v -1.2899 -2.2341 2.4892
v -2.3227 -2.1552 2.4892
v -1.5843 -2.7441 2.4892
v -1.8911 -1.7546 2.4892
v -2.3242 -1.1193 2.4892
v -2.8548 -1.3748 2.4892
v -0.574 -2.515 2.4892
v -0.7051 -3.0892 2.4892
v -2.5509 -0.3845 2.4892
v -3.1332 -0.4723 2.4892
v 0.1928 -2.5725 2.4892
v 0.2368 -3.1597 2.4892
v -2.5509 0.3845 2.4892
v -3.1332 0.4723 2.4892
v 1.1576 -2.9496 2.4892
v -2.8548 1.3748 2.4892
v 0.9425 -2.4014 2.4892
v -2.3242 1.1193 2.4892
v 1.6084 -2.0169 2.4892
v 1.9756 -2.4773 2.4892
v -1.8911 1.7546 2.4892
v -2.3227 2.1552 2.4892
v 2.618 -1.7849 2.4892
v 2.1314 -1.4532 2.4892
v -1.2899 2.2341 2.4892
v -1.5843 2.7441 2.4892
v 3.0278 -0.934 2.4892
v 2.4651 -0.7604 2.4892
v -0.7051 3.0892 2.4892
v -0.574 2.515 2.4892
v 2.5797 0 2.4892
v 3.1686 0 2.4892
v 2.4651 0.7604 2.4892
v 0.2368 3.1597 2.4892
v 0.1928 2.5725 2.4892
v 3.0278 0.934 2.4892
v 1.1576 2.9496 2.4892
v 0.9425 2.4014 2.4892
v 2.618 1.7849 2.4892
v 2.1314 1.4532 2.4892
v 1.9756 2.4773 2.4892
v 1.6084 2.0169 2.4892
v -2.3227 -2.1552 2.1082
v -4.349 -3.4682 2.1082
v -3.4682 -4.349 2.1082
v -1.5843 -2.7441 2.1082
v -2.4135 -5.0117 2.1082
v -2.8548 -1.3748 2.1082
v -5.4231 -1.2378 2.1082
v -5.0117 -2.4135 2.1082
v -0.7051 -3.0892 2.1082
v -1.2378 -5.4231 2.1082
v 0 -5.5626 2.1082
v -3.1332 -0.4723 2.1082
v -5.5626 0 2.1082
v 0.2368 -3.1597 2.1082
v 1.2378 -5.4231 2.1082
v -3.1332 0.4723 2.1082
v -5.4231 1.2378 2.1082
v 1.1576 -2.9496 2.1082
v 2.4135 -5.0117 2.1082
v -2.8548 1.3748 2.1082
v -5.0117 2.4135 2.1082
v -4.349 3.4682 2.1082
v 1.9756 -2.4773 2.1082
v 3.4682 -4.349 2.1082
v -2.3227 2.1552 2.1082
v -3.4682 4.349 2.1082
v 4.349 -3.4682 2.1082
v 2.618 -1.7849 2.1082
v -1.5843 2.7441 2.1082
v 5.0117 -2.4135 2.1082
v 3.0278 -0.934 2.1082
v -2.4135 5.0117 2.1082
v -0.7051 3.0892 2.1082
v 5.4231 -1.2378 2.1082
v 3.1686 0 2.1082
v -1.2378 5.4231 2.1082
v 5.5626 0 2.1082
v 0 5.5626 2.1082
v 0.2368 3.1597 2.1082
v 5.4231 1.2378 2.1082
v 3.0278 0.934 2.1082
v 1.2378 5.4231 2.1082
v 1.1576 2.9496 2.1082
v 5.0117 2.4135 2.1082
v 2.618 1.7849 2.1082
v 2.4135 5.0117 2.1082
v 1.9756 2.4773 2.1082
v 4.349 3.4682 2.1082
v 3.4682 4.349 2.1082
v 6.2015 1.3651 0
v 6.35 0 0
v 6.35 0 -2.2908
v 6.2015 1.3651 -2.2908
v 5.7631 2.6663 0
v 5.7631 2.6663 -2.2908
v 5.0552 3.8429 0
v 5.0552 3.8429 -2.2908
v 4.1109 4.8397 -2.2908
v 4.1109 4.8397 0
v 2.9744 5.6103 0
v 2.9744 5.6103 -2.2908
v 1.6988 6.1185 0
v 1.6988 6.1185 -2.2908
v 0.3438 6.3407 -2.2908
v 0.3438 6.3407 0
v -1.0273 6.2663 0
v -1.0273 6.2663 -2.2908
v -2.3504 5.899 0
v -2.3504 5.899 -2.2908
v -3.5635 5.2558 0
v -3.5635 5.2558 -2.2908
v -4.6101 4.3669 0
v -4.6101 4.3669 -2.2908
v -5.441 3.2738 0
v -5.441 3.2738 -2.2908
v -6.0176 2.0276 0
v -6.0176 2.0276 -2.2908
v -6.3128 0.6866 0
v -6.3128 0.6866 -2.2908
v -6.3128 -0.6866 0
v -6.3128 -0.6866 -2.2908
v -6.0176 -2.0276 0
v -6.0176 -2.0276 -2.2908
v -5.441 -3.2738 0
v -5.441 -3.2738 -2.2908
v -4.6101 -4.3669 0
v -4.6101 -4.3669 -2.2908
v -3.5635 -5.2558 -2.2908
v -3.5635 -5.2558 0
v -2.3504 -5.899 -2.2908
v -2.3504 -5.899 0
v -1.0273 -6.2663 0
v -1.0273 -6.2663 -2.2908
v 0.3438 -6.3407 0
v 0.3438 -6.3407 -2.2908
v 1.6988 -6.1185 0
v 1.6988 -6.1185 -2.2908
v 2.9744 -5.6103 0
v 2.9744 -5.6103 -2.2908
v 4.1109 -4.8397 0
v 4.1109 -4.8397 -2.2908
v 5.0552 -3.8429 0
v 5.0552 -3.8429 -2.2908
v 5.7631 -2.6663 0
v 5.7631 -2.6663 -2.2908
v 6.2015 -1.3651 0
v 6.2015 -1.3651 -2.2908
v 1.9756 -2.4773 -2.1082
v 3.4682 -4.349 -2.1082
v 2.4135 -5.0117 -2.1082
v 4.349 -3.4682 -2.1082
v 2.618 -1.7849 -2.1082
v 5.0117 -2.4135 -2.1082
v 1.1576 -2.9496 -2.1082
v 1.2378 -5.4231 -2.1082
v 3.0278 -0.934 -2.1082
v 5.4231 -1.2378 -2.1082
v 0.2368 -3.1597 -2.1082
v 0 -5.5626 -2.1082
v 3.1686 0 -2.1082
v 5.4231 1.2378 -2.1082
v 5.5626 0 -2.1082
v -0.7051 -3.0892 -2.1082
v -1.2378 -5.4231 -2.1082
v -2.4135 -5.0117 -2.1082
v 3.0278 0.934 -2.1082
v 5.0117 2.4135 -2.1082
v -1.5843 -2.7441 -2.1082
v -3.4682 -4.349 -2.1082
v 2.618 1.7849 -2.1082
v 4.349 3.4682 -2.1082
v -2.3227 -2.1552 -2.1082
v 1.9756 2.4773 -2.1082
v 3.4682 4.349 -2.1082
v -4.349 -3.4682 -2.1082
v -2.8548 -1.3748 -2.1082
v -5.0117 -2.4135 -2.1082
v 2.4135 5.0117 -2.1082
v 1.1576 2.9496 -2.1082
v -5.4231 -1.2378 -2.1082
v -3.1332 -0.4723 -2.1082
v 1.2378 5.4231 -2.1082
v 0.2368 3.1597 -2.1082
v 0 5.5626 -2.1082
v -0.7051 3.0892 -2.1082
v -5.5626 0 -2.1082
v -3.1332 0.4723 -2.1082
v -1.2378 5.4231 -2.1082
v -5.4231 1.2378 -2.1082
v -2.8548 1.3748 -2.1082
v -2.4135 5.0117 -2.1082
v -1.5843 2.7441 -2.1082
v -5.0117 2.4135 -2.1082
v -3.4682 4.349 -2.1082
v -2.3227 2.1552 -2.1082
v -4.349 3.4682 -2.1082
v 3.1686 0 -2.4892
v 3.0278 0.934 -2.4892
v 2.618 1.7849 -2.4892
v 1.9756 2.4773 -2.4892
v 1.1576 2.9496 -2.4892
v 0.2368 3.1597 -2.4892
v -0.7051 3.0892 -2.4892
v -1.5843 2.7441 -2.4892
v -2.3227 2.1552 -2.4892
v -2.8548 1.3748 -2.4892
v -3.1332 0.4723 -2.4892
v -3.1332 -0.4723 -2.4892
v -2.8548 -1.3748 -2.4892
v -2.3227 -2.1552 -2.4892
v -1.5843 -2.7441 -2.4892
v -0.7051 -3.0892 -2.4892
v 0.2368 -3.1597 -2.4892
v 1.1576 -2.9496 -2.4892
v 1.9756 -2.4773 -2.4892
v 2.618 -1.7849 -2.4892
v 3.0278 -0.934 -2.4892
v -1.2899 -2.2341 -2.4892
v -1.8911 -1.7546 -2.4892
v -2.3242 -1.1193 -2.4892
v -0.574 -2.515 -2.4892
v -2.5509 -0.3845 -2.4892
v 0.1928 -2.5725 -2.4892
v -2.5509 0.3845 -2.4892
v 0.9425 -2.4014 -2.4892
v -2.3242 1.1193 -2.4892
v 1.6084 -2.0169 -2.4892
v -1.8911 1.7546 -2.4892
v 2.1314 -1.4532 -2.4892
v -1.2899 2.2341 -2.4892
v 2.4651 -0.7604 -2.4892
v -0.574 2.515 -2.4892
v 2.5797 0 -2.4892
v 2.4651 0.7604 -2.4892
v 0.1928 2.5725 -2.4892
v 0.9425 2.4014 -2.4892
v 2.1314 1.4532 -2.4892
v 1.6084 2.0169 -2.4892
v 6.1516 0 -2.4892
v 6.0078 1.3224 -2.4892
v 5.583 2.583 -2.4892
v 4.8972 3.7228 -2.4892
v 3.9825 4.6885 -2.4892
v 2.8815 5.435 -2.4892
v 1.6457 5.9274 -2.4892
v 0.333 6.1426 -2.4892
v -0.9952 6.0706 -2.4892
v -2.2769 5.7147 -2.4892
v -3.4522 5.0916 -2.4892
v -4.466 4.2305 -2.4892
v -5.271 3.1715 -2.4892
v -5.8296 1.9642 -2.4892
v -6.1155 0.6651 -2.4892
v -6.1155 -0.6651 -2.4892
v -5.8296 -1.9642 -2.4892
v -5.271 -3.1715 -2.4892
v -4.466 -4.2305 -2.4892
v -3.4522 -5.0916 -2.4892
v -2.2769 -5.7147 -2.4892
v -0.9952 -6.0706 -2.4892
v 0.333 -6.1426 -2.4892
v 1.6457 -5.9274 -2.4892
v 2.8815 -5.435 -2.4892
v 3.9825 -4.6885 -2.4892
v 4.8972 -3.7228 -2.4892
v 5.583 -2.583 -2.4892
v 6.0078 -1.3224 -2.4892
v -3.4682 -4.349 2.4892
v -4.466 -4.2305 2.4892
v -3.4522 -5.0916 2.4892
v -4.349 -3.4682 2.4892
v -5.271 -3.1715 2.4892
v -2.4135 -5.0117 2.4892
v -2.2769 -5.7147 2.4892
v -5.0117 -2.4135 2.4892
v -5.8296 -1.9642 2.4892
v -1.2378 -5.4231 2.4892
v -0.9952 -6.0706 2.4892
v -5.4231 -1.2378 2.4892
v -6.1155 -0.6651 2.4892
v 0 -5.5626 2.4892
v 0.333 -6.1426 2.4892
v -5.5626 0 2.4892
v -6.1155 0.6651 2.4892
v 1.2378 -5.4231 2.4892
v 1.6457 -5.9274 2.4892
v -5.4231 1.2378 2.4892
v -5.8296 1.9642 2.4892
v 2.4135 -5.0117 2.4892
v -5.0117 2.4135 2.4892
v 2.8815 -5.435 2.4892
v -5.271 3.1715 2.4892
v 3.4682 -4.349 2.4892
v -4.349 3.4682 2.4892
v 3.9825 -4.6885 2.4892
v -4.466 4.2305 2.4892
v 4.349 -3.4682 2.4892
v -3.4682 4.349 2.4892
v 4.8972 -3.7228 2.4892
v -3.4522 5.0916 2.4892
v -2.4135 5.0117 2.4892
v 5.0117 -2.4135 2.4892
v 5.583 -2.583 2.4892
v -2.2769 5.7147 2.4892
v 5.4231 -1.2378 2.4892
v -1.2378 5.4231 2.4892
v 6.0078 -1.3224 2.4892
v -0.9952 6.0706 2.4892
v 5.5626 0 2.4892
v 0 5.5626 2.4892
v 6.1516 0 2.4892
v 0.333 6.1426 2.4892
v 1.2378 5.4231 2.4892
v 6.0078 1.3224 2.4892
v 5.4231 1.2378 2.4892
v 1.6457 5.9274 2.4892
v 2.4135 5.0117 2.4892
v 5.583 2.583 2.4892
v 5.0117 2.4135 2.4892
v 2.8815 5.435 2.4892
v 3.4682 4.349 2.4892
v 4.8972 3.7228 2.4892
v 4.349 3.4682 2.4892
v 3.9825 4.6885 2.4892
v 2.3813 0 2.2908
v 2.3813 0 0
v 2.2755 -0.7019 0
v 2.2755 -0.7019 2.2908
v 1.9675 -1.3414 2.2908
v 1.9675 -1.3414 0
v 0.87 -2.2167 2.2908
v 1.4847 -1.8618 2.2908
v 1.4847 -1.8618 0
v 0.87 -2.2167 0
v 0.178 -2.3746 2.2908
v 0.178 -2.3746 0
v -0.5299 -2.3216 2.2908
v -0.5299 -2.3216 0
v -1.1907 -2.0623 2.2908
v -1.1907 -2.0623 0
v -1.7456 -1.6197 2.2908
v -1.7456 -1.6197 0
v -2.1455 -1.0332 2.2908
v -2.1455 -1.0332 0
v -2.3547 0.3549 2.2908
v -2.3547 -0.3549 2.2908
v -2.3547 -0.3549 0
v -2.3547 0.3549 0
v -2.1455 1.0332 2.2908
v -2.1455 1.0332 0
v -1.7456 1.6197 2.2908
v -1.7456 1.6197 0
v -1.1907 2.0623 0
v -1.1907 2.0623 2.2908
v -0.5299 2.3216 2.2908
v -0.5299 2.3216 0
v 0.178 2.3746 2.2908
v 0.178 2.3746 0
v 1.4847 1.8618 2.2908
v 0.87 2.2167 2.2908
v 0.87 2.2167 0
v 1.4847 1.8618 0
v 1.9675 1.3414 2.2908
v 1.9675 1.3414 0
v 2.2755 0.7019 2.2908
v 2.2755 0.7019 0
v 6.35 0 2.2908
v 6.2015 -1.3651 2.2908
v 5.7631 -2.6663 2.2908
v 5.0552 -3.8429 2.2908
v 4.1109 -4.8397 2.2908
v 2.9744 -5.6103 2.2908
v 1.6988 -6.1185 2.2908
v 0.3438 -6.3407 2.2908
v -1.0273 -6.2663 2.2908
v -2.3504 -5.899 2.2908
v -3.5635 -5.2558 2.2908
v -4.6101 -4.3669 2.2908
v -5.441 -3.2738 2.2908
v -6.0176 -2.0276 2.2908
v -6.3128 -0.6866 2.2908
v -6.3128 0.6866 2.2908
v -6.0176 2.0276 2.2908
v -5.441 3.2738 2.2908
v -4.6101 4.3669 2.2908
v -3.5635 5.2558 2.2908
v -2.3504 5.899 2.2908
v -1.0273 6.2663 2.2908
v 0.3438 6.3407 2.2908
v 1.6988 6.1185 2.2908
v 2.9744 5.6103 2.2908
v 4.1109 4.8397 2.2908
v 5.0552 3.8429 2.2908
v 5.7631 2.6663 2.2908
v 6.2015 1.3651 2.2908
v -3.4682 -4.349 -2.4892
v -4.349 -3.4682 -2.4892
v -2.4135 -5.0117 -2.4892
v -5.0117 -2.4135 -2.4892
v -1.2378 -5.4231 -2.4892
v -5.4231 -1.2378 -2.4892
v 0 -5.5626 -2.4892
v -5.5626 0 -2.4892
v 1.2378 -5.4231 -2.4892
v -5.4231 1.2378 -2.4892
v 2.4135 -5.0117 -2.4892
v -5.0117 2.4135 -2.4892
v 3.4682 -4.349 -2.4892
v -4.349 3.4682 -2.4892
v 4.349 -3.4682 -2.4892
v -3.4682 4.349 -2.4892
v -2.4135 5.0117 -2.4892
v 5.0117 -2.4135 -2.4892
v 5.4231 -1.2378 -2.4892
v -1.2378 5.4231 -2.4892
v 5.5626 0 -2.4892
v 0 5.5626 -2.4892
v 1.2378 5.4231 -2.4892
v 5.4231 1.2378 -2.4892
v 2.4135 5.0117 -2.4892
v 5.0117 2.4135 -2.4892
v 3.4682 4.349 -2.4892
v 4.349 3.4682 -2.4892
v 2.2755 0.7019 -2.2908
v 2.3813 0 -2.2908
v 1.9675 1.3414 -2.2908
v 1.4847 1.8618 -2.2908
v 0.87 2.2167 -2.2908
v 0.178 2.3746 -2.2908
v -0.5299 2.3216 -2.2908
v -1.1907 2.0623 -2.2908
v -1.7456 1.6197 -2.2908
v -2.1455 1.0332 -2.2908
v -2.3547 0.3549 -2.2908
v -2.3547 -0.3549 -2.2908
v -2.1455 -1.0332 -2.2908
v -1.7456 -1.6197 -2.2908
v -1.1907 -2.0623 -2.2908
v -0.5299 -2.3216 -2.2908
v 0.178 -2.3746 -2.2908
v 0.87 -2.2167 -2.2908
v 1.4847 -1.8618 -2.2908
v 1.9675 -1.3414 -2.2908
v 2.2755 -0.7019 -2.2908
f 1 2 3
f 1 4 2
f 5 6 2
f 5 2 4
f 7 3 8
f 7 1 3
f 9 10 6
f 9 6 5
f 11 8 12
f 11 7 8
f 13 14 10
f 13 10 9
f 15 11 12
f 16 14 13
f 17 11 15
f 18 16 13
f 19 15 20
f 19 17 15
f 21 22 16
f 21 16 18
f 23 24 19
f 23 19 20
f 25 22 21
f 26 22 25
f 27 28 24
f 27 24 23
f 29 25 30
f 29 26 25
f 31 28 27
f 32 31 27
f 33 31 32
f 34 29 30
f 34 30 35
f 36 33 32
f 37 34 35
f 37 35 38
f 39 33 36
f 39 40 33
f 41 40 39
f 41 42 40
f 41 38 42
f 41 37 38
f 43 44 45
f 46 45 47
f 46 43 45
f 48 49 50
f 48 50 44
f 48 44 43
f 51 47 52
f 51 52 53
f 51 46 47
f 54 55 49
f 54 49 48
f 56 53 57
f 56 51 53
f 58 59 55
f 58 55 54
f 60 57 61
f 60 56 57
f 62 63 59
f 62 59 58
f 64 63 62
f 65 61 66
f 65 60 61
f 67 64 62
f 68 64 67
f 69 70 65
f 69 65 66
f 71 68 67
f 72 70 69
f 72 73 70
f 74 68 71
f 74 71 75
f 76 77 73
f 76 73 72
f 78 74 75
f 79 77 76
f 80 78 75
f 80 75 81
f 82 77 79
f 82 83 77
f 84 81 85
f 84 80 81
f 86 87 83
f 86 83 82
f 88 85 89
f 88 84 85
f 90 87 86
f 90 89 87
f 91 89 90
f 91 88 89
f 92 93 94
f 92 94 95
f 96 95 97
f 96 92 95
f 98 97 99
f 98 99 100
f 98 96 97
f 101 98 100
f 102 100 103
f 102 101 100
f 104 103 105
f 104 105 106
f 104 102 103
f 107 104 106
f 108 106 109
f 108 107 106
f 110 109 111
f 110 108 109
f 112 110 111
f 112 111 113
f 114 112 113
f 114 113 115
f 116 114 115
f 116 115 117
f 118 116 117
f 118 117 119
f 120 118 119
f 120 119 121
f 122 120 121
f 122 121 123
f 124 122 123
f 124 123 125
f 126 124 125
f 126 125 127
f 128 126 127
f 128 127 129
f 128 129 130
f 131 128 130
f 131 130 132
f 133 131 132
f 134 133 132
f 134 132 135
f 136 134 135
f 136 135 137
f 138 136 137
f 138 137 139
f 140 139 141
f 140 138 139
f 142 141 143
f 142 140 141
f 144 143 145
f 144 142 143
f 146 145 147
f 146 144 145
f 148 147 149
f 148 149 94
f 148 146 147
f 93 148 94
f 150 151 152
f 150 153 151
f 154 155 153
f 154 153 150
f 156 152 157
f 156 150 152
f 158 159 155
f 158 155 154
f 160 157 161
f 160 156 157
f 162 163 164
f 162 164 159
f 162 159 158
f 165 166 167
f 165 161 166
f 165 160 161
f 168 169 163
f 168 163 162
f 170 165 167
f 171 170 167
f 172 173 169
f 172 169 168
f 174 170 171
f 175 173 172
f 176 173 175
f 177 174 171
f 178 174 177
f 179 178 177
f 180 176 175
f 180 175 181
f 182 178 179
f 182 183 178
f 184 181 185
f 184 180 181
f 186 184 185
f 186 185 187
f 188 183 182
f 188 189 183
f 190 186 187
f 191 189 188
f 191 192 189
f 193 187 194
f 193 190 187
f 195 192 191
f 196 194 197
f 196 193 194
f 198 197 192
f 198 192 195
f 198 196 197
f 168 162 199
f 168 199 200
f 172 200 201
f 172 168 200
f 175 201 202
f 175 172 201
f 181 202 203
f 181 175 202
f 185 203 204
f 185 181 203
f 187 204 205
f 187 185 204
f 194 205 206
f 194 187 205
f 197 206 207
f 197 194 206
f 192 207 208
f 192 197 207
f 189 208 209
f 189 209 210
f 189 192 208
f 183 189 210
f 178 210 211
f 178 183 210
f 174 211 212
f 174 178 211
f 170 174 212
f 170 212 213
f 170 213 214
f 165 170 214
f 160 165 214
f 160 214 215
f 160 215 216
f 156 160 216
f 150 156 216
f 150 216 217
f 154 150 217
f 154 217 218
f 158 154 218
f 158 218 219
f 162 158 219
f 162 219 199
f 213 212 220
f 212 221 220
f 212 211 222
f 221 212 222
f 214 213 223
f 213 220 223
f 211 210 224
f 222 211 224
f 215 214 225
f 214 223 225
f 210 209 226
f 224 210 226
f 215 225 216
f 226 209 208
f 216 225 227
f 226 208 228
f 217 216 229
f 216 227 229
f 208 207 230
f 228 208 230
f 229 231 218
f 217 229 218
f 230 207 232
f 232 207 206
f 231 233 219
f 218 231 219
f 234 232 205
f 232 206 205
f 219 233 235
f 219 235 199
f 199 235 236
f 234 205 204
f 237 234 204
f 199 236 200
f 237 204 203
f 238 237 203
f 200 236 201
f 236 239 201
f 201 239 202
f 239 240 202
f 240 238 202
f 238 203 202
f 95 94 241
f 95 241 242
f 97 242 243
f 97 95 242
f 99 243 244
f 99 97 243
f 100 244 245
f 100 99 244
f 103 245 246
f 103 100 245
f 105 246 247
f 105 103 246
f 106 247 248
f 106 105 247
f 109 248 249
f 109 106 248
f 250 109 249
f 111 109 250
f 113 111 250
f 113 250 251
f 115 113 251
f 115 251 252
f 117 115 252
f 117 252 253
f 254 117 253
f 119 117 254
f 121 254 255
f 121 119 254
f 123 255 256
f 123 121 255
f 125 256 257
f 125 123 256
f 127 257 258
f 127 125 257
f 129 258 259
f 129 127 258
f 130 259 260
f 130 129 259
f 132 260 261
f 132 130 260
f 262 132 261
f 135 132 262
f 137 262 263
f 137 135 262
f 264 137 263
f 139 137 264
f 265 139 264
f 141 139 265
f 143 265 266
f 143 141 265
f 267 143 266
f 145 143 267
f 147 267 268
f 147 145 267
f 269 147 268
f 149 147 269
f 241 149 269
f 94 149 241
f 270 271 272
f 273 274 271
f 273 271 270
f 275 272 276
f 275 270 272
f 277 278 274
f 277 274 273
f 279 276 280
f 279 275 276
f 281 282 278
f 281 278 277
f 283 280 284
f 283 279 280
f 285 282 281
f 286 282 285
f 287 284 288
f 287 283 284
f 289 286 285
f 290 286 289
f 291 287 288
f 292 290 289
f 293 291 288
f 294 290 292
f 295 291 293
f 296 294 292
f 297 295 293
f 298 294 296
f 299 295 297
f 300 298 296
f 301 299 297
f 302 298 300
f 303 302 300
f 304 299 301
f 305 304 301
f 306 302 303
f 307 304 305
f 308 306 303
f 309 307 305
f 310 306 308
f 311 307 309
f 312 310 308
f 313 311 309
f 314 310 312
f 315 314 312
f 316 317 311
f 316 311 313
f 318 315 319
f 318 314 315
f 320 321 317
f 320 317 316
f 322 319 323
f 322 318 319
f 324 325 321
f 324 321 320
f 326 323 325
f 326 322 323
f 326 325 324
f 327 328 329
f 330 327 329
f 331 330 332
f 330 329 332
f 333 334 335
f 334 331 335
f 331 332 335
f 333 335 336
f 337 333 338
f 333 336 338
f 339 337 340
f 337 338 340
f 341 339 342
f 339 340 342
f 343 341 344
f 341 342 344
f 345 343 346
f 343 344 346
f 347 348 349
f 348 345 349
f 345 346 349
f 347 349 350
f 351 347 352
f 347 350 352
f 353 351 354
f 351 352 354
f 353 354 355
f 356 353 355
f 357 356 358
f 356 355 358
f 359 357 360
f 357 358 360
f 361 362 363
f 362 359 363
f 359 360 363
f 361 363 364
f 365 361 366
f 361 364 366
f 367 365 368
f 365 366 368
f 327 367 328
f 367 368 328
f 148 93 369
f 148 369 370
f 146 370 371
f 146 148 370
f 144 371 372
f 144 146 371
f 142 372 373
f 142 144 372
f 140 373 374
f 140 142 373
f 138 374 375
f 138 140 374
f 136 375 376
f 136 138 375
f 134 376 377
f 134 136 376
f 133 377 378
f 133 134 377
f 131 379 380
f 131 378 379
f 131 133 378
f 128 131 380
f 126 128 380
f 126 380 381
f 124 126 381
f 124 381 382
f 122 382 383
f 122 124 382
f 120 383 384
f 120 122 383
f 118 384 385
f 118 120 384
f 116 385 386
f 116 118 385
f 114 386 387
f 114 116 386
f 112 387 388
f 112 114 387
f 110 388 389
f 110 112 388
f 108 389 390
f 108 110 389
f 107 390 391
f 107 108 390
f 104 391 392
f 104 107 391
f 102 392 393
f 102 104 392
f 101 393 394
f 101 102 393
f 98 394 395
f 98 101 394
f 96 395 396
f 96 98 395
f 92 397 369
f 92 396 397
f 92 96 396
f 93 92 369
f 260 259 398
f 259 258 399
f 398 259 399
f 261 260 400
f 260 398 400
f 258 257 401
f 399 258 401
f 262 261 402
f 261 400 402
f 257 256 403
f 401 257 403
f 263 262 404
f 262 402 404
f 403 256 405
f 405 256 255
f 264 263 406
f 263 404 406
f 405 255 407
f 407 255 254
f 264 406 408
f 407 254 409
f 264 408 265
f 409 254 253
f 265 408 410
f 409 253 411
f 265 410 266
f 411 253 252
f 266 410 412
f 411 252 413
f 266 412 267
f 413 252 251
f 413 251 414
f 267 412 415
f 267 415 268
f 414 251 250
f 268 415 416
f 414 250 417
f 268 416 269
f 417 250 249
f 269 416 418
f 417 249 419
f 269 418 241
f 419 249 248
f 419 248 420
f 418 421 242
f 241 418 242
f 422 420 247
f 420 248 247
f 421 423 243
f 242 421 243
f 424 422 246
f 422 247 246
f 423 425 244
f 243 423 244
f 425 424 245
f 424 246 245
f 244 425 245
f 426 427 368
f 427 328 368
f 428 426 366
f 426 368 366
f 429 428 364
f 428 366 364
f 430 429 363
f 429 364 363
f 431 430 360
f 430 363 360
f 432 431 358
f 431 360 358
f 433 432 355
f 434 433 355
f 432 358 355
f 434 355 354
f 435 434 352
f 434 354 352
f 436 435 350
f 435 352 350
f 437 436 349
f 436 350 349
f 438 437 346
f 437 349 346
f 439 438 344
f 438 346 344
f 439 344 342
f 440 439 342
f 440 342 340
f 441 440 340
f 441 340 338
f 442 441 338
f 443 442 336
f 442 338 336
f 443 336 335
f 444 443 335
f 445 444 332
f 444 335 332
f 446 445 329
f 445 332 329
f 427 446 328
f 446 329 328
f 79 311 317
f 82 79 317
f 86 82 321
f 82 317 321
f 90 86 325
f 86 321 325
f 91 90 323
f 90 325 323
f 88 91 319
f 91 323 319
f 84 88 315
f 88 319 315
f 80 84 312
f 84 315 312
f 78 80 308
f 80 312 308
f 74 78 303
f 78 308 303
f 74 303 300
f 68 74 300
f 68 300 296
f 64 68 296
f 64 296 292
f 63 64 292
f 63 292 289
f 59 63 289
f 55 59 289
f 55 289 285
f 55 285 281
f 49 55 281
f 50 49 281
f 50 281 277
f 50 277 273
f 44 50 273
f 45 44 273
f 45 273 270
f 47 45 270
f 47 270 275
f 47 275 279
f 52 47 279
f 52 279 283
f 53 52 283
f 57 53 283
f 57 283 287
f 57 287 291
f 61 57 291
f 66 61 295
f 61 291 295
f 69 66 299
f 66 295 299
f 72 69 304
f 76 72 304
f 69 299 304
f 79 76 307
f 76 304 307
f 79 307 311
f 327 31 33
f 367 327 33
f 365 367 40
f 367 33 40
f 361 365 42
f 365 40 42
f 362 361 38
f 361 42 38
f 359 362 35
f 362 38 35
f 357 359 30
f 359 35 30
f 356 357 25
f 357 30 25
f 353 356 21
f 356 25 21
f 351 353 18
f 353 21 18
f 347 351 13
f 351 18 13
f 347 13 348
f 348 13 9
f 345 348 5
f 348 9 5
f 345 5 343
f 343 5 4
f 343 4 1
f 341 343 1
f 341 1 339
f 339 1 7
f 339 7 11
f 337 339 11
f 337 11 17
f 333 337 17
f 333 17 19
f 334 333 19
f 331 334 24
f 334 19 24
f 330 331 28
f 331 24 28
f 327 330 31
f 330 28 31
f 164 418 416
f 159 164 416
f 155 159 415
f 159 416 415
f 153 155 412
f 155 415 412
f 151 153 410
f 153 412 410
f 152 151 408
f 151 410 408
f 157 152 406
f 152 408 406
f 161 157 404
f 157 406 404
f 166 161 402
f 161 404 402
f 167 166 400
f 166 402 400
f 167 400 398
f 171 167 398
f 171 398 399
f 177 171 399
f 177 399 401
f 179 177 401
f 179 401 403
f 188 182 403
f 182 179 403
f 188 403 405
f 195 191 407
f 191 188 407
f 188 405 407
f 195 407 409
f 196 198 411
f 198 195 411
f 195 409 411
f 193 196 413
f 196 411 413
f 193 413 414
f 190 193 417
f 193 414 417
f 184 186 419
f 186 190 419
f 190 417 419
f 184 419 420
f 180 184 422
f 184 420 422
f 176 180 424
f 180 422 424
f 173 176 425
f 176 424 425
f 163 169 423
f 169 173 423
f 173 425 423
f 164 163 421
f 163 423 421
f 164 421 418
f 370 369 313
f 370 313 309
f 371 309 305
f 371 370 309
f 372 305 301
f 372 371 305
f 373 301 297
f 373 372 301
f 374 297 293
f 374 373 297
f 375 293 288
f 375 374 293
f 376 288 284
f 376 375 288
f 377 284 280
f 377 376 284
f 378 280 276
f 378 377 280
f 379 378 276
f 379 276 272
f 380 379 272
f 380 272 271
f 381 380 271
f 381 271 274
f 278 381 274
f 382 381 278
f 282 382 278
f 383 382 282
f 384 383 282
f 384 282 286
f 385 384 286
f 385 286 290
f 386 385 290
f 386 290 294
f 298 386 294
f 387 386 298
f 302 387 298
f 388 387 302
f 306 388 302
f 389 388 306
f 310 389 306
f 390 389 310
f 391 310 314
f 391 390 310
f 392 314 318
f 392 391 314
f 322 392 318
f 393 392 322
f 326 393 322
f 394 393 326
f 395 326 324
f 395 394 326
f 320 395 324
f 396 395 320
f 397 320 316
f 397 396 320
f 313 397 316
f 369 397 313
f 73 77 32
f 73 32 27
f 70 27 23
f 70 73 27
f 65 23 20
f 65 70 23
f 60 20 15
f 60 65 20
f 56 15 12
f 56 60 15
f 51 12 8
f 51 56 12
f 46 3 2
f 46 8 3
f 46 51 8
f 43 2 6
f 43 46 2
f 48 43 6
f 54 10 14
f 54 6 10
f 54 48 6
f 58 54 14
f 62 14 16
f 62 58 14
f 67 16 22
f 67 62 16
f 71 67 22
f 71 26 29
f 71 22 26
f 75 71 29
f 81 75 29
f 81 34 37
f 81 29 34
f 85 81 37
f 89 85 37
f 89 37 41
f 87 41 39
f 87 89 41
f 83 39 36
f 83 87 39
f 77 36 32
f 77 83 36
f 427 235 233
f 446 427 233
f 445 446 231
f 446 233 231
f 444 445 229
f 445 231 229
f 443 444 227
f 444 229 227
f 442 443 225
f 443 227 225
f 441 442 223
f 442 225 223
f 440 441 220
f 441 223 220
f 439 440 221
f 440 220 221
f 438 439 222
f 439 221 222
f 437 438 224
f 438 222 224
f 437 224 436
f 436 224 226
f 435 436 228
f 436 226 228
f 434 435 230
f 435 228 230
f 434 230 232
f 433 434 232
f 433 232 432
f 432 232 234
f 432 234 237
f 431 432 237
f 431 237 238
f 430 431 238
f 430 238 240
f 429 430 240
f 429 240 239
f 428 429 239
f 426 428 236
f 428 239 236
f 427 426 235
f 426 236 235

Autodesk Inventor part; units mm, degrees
ref_plane "YZ Plane" through (0, 0, 0) normal (1, 0, 0) x (0, 1, 0)
ref_plane "XZ Plane" through (0, 0, 0) normal (0, 1, 0) x (-1, 0, 0)
ref_plane "XY Plane" through (0, 0, 0) normal (0, 0, 1) x (1, 0, 0)
sketch "Sketch1" plane through (0, 0, 0) normal (0, 0, 1) x (1, 0, 0)
  circle A0 centre (0, 0) radius 2.3813
  circle A1 centre (0, 0) radius 6.35
  dimension "d0" = 4.7625
  dimension "d1" = 12.7
extrude "Extrusion1" add sketch "Sketch1" along normal mid plane 4.9784
chamfer "Chamfer1" distance 0.1984 angle 45 4 edges at (-6.35, 0, 2.4892) (-2.3813, 0, 2.4892) (-6.35, 0, -2.4892) (-2.3813, 0, -2.4892)
sketch "Sketch2" plane through (0, 0, 0) normal (0, 1, 0) x (-1, 0, 0)
  line L0 (-6.1516, 2.4892) -> (6.1516, 2.4892) projected
  line L1 (2.5797, 2.4892) -> (-2.5797, 2.4892) projected
  line L2 (-5.5626, 2.4892) -> (-3.1686, 2.4892)
  line L3 (-3.1686, 2.4892) -> (-3.1686, 2.1082)
  line L4 (-3.1686, 2.1082) -> (-5.5626, 2.1082)
  line L5 (-5.5626, 2.1082) -> (-5.5626, 2.4892)
  line L6 (-6.35, -2.2908) -> (-6.35, 2.2908) projected
  line L7 (-2.3813, -2.2908) -> (-2.3813, 2.2908) projected
  line L8 (0, 0) -> (0, 3.7082)
  dimension "d7" = 0.381
  dimension "d8" = 0.7874
  dimension "d9" = 0.7874
revolve "Revolution1" cut sketch "Sketch2" angle 360 about axis through (0, 0, 0) along (0, 0, 1)
mirror "Mirror1" about plane through (0, 0, 0) normal (0, 0, 1) of "Revolution1"
equation "\"d9\" = d8"
properties part number "Homemade_bearing"
